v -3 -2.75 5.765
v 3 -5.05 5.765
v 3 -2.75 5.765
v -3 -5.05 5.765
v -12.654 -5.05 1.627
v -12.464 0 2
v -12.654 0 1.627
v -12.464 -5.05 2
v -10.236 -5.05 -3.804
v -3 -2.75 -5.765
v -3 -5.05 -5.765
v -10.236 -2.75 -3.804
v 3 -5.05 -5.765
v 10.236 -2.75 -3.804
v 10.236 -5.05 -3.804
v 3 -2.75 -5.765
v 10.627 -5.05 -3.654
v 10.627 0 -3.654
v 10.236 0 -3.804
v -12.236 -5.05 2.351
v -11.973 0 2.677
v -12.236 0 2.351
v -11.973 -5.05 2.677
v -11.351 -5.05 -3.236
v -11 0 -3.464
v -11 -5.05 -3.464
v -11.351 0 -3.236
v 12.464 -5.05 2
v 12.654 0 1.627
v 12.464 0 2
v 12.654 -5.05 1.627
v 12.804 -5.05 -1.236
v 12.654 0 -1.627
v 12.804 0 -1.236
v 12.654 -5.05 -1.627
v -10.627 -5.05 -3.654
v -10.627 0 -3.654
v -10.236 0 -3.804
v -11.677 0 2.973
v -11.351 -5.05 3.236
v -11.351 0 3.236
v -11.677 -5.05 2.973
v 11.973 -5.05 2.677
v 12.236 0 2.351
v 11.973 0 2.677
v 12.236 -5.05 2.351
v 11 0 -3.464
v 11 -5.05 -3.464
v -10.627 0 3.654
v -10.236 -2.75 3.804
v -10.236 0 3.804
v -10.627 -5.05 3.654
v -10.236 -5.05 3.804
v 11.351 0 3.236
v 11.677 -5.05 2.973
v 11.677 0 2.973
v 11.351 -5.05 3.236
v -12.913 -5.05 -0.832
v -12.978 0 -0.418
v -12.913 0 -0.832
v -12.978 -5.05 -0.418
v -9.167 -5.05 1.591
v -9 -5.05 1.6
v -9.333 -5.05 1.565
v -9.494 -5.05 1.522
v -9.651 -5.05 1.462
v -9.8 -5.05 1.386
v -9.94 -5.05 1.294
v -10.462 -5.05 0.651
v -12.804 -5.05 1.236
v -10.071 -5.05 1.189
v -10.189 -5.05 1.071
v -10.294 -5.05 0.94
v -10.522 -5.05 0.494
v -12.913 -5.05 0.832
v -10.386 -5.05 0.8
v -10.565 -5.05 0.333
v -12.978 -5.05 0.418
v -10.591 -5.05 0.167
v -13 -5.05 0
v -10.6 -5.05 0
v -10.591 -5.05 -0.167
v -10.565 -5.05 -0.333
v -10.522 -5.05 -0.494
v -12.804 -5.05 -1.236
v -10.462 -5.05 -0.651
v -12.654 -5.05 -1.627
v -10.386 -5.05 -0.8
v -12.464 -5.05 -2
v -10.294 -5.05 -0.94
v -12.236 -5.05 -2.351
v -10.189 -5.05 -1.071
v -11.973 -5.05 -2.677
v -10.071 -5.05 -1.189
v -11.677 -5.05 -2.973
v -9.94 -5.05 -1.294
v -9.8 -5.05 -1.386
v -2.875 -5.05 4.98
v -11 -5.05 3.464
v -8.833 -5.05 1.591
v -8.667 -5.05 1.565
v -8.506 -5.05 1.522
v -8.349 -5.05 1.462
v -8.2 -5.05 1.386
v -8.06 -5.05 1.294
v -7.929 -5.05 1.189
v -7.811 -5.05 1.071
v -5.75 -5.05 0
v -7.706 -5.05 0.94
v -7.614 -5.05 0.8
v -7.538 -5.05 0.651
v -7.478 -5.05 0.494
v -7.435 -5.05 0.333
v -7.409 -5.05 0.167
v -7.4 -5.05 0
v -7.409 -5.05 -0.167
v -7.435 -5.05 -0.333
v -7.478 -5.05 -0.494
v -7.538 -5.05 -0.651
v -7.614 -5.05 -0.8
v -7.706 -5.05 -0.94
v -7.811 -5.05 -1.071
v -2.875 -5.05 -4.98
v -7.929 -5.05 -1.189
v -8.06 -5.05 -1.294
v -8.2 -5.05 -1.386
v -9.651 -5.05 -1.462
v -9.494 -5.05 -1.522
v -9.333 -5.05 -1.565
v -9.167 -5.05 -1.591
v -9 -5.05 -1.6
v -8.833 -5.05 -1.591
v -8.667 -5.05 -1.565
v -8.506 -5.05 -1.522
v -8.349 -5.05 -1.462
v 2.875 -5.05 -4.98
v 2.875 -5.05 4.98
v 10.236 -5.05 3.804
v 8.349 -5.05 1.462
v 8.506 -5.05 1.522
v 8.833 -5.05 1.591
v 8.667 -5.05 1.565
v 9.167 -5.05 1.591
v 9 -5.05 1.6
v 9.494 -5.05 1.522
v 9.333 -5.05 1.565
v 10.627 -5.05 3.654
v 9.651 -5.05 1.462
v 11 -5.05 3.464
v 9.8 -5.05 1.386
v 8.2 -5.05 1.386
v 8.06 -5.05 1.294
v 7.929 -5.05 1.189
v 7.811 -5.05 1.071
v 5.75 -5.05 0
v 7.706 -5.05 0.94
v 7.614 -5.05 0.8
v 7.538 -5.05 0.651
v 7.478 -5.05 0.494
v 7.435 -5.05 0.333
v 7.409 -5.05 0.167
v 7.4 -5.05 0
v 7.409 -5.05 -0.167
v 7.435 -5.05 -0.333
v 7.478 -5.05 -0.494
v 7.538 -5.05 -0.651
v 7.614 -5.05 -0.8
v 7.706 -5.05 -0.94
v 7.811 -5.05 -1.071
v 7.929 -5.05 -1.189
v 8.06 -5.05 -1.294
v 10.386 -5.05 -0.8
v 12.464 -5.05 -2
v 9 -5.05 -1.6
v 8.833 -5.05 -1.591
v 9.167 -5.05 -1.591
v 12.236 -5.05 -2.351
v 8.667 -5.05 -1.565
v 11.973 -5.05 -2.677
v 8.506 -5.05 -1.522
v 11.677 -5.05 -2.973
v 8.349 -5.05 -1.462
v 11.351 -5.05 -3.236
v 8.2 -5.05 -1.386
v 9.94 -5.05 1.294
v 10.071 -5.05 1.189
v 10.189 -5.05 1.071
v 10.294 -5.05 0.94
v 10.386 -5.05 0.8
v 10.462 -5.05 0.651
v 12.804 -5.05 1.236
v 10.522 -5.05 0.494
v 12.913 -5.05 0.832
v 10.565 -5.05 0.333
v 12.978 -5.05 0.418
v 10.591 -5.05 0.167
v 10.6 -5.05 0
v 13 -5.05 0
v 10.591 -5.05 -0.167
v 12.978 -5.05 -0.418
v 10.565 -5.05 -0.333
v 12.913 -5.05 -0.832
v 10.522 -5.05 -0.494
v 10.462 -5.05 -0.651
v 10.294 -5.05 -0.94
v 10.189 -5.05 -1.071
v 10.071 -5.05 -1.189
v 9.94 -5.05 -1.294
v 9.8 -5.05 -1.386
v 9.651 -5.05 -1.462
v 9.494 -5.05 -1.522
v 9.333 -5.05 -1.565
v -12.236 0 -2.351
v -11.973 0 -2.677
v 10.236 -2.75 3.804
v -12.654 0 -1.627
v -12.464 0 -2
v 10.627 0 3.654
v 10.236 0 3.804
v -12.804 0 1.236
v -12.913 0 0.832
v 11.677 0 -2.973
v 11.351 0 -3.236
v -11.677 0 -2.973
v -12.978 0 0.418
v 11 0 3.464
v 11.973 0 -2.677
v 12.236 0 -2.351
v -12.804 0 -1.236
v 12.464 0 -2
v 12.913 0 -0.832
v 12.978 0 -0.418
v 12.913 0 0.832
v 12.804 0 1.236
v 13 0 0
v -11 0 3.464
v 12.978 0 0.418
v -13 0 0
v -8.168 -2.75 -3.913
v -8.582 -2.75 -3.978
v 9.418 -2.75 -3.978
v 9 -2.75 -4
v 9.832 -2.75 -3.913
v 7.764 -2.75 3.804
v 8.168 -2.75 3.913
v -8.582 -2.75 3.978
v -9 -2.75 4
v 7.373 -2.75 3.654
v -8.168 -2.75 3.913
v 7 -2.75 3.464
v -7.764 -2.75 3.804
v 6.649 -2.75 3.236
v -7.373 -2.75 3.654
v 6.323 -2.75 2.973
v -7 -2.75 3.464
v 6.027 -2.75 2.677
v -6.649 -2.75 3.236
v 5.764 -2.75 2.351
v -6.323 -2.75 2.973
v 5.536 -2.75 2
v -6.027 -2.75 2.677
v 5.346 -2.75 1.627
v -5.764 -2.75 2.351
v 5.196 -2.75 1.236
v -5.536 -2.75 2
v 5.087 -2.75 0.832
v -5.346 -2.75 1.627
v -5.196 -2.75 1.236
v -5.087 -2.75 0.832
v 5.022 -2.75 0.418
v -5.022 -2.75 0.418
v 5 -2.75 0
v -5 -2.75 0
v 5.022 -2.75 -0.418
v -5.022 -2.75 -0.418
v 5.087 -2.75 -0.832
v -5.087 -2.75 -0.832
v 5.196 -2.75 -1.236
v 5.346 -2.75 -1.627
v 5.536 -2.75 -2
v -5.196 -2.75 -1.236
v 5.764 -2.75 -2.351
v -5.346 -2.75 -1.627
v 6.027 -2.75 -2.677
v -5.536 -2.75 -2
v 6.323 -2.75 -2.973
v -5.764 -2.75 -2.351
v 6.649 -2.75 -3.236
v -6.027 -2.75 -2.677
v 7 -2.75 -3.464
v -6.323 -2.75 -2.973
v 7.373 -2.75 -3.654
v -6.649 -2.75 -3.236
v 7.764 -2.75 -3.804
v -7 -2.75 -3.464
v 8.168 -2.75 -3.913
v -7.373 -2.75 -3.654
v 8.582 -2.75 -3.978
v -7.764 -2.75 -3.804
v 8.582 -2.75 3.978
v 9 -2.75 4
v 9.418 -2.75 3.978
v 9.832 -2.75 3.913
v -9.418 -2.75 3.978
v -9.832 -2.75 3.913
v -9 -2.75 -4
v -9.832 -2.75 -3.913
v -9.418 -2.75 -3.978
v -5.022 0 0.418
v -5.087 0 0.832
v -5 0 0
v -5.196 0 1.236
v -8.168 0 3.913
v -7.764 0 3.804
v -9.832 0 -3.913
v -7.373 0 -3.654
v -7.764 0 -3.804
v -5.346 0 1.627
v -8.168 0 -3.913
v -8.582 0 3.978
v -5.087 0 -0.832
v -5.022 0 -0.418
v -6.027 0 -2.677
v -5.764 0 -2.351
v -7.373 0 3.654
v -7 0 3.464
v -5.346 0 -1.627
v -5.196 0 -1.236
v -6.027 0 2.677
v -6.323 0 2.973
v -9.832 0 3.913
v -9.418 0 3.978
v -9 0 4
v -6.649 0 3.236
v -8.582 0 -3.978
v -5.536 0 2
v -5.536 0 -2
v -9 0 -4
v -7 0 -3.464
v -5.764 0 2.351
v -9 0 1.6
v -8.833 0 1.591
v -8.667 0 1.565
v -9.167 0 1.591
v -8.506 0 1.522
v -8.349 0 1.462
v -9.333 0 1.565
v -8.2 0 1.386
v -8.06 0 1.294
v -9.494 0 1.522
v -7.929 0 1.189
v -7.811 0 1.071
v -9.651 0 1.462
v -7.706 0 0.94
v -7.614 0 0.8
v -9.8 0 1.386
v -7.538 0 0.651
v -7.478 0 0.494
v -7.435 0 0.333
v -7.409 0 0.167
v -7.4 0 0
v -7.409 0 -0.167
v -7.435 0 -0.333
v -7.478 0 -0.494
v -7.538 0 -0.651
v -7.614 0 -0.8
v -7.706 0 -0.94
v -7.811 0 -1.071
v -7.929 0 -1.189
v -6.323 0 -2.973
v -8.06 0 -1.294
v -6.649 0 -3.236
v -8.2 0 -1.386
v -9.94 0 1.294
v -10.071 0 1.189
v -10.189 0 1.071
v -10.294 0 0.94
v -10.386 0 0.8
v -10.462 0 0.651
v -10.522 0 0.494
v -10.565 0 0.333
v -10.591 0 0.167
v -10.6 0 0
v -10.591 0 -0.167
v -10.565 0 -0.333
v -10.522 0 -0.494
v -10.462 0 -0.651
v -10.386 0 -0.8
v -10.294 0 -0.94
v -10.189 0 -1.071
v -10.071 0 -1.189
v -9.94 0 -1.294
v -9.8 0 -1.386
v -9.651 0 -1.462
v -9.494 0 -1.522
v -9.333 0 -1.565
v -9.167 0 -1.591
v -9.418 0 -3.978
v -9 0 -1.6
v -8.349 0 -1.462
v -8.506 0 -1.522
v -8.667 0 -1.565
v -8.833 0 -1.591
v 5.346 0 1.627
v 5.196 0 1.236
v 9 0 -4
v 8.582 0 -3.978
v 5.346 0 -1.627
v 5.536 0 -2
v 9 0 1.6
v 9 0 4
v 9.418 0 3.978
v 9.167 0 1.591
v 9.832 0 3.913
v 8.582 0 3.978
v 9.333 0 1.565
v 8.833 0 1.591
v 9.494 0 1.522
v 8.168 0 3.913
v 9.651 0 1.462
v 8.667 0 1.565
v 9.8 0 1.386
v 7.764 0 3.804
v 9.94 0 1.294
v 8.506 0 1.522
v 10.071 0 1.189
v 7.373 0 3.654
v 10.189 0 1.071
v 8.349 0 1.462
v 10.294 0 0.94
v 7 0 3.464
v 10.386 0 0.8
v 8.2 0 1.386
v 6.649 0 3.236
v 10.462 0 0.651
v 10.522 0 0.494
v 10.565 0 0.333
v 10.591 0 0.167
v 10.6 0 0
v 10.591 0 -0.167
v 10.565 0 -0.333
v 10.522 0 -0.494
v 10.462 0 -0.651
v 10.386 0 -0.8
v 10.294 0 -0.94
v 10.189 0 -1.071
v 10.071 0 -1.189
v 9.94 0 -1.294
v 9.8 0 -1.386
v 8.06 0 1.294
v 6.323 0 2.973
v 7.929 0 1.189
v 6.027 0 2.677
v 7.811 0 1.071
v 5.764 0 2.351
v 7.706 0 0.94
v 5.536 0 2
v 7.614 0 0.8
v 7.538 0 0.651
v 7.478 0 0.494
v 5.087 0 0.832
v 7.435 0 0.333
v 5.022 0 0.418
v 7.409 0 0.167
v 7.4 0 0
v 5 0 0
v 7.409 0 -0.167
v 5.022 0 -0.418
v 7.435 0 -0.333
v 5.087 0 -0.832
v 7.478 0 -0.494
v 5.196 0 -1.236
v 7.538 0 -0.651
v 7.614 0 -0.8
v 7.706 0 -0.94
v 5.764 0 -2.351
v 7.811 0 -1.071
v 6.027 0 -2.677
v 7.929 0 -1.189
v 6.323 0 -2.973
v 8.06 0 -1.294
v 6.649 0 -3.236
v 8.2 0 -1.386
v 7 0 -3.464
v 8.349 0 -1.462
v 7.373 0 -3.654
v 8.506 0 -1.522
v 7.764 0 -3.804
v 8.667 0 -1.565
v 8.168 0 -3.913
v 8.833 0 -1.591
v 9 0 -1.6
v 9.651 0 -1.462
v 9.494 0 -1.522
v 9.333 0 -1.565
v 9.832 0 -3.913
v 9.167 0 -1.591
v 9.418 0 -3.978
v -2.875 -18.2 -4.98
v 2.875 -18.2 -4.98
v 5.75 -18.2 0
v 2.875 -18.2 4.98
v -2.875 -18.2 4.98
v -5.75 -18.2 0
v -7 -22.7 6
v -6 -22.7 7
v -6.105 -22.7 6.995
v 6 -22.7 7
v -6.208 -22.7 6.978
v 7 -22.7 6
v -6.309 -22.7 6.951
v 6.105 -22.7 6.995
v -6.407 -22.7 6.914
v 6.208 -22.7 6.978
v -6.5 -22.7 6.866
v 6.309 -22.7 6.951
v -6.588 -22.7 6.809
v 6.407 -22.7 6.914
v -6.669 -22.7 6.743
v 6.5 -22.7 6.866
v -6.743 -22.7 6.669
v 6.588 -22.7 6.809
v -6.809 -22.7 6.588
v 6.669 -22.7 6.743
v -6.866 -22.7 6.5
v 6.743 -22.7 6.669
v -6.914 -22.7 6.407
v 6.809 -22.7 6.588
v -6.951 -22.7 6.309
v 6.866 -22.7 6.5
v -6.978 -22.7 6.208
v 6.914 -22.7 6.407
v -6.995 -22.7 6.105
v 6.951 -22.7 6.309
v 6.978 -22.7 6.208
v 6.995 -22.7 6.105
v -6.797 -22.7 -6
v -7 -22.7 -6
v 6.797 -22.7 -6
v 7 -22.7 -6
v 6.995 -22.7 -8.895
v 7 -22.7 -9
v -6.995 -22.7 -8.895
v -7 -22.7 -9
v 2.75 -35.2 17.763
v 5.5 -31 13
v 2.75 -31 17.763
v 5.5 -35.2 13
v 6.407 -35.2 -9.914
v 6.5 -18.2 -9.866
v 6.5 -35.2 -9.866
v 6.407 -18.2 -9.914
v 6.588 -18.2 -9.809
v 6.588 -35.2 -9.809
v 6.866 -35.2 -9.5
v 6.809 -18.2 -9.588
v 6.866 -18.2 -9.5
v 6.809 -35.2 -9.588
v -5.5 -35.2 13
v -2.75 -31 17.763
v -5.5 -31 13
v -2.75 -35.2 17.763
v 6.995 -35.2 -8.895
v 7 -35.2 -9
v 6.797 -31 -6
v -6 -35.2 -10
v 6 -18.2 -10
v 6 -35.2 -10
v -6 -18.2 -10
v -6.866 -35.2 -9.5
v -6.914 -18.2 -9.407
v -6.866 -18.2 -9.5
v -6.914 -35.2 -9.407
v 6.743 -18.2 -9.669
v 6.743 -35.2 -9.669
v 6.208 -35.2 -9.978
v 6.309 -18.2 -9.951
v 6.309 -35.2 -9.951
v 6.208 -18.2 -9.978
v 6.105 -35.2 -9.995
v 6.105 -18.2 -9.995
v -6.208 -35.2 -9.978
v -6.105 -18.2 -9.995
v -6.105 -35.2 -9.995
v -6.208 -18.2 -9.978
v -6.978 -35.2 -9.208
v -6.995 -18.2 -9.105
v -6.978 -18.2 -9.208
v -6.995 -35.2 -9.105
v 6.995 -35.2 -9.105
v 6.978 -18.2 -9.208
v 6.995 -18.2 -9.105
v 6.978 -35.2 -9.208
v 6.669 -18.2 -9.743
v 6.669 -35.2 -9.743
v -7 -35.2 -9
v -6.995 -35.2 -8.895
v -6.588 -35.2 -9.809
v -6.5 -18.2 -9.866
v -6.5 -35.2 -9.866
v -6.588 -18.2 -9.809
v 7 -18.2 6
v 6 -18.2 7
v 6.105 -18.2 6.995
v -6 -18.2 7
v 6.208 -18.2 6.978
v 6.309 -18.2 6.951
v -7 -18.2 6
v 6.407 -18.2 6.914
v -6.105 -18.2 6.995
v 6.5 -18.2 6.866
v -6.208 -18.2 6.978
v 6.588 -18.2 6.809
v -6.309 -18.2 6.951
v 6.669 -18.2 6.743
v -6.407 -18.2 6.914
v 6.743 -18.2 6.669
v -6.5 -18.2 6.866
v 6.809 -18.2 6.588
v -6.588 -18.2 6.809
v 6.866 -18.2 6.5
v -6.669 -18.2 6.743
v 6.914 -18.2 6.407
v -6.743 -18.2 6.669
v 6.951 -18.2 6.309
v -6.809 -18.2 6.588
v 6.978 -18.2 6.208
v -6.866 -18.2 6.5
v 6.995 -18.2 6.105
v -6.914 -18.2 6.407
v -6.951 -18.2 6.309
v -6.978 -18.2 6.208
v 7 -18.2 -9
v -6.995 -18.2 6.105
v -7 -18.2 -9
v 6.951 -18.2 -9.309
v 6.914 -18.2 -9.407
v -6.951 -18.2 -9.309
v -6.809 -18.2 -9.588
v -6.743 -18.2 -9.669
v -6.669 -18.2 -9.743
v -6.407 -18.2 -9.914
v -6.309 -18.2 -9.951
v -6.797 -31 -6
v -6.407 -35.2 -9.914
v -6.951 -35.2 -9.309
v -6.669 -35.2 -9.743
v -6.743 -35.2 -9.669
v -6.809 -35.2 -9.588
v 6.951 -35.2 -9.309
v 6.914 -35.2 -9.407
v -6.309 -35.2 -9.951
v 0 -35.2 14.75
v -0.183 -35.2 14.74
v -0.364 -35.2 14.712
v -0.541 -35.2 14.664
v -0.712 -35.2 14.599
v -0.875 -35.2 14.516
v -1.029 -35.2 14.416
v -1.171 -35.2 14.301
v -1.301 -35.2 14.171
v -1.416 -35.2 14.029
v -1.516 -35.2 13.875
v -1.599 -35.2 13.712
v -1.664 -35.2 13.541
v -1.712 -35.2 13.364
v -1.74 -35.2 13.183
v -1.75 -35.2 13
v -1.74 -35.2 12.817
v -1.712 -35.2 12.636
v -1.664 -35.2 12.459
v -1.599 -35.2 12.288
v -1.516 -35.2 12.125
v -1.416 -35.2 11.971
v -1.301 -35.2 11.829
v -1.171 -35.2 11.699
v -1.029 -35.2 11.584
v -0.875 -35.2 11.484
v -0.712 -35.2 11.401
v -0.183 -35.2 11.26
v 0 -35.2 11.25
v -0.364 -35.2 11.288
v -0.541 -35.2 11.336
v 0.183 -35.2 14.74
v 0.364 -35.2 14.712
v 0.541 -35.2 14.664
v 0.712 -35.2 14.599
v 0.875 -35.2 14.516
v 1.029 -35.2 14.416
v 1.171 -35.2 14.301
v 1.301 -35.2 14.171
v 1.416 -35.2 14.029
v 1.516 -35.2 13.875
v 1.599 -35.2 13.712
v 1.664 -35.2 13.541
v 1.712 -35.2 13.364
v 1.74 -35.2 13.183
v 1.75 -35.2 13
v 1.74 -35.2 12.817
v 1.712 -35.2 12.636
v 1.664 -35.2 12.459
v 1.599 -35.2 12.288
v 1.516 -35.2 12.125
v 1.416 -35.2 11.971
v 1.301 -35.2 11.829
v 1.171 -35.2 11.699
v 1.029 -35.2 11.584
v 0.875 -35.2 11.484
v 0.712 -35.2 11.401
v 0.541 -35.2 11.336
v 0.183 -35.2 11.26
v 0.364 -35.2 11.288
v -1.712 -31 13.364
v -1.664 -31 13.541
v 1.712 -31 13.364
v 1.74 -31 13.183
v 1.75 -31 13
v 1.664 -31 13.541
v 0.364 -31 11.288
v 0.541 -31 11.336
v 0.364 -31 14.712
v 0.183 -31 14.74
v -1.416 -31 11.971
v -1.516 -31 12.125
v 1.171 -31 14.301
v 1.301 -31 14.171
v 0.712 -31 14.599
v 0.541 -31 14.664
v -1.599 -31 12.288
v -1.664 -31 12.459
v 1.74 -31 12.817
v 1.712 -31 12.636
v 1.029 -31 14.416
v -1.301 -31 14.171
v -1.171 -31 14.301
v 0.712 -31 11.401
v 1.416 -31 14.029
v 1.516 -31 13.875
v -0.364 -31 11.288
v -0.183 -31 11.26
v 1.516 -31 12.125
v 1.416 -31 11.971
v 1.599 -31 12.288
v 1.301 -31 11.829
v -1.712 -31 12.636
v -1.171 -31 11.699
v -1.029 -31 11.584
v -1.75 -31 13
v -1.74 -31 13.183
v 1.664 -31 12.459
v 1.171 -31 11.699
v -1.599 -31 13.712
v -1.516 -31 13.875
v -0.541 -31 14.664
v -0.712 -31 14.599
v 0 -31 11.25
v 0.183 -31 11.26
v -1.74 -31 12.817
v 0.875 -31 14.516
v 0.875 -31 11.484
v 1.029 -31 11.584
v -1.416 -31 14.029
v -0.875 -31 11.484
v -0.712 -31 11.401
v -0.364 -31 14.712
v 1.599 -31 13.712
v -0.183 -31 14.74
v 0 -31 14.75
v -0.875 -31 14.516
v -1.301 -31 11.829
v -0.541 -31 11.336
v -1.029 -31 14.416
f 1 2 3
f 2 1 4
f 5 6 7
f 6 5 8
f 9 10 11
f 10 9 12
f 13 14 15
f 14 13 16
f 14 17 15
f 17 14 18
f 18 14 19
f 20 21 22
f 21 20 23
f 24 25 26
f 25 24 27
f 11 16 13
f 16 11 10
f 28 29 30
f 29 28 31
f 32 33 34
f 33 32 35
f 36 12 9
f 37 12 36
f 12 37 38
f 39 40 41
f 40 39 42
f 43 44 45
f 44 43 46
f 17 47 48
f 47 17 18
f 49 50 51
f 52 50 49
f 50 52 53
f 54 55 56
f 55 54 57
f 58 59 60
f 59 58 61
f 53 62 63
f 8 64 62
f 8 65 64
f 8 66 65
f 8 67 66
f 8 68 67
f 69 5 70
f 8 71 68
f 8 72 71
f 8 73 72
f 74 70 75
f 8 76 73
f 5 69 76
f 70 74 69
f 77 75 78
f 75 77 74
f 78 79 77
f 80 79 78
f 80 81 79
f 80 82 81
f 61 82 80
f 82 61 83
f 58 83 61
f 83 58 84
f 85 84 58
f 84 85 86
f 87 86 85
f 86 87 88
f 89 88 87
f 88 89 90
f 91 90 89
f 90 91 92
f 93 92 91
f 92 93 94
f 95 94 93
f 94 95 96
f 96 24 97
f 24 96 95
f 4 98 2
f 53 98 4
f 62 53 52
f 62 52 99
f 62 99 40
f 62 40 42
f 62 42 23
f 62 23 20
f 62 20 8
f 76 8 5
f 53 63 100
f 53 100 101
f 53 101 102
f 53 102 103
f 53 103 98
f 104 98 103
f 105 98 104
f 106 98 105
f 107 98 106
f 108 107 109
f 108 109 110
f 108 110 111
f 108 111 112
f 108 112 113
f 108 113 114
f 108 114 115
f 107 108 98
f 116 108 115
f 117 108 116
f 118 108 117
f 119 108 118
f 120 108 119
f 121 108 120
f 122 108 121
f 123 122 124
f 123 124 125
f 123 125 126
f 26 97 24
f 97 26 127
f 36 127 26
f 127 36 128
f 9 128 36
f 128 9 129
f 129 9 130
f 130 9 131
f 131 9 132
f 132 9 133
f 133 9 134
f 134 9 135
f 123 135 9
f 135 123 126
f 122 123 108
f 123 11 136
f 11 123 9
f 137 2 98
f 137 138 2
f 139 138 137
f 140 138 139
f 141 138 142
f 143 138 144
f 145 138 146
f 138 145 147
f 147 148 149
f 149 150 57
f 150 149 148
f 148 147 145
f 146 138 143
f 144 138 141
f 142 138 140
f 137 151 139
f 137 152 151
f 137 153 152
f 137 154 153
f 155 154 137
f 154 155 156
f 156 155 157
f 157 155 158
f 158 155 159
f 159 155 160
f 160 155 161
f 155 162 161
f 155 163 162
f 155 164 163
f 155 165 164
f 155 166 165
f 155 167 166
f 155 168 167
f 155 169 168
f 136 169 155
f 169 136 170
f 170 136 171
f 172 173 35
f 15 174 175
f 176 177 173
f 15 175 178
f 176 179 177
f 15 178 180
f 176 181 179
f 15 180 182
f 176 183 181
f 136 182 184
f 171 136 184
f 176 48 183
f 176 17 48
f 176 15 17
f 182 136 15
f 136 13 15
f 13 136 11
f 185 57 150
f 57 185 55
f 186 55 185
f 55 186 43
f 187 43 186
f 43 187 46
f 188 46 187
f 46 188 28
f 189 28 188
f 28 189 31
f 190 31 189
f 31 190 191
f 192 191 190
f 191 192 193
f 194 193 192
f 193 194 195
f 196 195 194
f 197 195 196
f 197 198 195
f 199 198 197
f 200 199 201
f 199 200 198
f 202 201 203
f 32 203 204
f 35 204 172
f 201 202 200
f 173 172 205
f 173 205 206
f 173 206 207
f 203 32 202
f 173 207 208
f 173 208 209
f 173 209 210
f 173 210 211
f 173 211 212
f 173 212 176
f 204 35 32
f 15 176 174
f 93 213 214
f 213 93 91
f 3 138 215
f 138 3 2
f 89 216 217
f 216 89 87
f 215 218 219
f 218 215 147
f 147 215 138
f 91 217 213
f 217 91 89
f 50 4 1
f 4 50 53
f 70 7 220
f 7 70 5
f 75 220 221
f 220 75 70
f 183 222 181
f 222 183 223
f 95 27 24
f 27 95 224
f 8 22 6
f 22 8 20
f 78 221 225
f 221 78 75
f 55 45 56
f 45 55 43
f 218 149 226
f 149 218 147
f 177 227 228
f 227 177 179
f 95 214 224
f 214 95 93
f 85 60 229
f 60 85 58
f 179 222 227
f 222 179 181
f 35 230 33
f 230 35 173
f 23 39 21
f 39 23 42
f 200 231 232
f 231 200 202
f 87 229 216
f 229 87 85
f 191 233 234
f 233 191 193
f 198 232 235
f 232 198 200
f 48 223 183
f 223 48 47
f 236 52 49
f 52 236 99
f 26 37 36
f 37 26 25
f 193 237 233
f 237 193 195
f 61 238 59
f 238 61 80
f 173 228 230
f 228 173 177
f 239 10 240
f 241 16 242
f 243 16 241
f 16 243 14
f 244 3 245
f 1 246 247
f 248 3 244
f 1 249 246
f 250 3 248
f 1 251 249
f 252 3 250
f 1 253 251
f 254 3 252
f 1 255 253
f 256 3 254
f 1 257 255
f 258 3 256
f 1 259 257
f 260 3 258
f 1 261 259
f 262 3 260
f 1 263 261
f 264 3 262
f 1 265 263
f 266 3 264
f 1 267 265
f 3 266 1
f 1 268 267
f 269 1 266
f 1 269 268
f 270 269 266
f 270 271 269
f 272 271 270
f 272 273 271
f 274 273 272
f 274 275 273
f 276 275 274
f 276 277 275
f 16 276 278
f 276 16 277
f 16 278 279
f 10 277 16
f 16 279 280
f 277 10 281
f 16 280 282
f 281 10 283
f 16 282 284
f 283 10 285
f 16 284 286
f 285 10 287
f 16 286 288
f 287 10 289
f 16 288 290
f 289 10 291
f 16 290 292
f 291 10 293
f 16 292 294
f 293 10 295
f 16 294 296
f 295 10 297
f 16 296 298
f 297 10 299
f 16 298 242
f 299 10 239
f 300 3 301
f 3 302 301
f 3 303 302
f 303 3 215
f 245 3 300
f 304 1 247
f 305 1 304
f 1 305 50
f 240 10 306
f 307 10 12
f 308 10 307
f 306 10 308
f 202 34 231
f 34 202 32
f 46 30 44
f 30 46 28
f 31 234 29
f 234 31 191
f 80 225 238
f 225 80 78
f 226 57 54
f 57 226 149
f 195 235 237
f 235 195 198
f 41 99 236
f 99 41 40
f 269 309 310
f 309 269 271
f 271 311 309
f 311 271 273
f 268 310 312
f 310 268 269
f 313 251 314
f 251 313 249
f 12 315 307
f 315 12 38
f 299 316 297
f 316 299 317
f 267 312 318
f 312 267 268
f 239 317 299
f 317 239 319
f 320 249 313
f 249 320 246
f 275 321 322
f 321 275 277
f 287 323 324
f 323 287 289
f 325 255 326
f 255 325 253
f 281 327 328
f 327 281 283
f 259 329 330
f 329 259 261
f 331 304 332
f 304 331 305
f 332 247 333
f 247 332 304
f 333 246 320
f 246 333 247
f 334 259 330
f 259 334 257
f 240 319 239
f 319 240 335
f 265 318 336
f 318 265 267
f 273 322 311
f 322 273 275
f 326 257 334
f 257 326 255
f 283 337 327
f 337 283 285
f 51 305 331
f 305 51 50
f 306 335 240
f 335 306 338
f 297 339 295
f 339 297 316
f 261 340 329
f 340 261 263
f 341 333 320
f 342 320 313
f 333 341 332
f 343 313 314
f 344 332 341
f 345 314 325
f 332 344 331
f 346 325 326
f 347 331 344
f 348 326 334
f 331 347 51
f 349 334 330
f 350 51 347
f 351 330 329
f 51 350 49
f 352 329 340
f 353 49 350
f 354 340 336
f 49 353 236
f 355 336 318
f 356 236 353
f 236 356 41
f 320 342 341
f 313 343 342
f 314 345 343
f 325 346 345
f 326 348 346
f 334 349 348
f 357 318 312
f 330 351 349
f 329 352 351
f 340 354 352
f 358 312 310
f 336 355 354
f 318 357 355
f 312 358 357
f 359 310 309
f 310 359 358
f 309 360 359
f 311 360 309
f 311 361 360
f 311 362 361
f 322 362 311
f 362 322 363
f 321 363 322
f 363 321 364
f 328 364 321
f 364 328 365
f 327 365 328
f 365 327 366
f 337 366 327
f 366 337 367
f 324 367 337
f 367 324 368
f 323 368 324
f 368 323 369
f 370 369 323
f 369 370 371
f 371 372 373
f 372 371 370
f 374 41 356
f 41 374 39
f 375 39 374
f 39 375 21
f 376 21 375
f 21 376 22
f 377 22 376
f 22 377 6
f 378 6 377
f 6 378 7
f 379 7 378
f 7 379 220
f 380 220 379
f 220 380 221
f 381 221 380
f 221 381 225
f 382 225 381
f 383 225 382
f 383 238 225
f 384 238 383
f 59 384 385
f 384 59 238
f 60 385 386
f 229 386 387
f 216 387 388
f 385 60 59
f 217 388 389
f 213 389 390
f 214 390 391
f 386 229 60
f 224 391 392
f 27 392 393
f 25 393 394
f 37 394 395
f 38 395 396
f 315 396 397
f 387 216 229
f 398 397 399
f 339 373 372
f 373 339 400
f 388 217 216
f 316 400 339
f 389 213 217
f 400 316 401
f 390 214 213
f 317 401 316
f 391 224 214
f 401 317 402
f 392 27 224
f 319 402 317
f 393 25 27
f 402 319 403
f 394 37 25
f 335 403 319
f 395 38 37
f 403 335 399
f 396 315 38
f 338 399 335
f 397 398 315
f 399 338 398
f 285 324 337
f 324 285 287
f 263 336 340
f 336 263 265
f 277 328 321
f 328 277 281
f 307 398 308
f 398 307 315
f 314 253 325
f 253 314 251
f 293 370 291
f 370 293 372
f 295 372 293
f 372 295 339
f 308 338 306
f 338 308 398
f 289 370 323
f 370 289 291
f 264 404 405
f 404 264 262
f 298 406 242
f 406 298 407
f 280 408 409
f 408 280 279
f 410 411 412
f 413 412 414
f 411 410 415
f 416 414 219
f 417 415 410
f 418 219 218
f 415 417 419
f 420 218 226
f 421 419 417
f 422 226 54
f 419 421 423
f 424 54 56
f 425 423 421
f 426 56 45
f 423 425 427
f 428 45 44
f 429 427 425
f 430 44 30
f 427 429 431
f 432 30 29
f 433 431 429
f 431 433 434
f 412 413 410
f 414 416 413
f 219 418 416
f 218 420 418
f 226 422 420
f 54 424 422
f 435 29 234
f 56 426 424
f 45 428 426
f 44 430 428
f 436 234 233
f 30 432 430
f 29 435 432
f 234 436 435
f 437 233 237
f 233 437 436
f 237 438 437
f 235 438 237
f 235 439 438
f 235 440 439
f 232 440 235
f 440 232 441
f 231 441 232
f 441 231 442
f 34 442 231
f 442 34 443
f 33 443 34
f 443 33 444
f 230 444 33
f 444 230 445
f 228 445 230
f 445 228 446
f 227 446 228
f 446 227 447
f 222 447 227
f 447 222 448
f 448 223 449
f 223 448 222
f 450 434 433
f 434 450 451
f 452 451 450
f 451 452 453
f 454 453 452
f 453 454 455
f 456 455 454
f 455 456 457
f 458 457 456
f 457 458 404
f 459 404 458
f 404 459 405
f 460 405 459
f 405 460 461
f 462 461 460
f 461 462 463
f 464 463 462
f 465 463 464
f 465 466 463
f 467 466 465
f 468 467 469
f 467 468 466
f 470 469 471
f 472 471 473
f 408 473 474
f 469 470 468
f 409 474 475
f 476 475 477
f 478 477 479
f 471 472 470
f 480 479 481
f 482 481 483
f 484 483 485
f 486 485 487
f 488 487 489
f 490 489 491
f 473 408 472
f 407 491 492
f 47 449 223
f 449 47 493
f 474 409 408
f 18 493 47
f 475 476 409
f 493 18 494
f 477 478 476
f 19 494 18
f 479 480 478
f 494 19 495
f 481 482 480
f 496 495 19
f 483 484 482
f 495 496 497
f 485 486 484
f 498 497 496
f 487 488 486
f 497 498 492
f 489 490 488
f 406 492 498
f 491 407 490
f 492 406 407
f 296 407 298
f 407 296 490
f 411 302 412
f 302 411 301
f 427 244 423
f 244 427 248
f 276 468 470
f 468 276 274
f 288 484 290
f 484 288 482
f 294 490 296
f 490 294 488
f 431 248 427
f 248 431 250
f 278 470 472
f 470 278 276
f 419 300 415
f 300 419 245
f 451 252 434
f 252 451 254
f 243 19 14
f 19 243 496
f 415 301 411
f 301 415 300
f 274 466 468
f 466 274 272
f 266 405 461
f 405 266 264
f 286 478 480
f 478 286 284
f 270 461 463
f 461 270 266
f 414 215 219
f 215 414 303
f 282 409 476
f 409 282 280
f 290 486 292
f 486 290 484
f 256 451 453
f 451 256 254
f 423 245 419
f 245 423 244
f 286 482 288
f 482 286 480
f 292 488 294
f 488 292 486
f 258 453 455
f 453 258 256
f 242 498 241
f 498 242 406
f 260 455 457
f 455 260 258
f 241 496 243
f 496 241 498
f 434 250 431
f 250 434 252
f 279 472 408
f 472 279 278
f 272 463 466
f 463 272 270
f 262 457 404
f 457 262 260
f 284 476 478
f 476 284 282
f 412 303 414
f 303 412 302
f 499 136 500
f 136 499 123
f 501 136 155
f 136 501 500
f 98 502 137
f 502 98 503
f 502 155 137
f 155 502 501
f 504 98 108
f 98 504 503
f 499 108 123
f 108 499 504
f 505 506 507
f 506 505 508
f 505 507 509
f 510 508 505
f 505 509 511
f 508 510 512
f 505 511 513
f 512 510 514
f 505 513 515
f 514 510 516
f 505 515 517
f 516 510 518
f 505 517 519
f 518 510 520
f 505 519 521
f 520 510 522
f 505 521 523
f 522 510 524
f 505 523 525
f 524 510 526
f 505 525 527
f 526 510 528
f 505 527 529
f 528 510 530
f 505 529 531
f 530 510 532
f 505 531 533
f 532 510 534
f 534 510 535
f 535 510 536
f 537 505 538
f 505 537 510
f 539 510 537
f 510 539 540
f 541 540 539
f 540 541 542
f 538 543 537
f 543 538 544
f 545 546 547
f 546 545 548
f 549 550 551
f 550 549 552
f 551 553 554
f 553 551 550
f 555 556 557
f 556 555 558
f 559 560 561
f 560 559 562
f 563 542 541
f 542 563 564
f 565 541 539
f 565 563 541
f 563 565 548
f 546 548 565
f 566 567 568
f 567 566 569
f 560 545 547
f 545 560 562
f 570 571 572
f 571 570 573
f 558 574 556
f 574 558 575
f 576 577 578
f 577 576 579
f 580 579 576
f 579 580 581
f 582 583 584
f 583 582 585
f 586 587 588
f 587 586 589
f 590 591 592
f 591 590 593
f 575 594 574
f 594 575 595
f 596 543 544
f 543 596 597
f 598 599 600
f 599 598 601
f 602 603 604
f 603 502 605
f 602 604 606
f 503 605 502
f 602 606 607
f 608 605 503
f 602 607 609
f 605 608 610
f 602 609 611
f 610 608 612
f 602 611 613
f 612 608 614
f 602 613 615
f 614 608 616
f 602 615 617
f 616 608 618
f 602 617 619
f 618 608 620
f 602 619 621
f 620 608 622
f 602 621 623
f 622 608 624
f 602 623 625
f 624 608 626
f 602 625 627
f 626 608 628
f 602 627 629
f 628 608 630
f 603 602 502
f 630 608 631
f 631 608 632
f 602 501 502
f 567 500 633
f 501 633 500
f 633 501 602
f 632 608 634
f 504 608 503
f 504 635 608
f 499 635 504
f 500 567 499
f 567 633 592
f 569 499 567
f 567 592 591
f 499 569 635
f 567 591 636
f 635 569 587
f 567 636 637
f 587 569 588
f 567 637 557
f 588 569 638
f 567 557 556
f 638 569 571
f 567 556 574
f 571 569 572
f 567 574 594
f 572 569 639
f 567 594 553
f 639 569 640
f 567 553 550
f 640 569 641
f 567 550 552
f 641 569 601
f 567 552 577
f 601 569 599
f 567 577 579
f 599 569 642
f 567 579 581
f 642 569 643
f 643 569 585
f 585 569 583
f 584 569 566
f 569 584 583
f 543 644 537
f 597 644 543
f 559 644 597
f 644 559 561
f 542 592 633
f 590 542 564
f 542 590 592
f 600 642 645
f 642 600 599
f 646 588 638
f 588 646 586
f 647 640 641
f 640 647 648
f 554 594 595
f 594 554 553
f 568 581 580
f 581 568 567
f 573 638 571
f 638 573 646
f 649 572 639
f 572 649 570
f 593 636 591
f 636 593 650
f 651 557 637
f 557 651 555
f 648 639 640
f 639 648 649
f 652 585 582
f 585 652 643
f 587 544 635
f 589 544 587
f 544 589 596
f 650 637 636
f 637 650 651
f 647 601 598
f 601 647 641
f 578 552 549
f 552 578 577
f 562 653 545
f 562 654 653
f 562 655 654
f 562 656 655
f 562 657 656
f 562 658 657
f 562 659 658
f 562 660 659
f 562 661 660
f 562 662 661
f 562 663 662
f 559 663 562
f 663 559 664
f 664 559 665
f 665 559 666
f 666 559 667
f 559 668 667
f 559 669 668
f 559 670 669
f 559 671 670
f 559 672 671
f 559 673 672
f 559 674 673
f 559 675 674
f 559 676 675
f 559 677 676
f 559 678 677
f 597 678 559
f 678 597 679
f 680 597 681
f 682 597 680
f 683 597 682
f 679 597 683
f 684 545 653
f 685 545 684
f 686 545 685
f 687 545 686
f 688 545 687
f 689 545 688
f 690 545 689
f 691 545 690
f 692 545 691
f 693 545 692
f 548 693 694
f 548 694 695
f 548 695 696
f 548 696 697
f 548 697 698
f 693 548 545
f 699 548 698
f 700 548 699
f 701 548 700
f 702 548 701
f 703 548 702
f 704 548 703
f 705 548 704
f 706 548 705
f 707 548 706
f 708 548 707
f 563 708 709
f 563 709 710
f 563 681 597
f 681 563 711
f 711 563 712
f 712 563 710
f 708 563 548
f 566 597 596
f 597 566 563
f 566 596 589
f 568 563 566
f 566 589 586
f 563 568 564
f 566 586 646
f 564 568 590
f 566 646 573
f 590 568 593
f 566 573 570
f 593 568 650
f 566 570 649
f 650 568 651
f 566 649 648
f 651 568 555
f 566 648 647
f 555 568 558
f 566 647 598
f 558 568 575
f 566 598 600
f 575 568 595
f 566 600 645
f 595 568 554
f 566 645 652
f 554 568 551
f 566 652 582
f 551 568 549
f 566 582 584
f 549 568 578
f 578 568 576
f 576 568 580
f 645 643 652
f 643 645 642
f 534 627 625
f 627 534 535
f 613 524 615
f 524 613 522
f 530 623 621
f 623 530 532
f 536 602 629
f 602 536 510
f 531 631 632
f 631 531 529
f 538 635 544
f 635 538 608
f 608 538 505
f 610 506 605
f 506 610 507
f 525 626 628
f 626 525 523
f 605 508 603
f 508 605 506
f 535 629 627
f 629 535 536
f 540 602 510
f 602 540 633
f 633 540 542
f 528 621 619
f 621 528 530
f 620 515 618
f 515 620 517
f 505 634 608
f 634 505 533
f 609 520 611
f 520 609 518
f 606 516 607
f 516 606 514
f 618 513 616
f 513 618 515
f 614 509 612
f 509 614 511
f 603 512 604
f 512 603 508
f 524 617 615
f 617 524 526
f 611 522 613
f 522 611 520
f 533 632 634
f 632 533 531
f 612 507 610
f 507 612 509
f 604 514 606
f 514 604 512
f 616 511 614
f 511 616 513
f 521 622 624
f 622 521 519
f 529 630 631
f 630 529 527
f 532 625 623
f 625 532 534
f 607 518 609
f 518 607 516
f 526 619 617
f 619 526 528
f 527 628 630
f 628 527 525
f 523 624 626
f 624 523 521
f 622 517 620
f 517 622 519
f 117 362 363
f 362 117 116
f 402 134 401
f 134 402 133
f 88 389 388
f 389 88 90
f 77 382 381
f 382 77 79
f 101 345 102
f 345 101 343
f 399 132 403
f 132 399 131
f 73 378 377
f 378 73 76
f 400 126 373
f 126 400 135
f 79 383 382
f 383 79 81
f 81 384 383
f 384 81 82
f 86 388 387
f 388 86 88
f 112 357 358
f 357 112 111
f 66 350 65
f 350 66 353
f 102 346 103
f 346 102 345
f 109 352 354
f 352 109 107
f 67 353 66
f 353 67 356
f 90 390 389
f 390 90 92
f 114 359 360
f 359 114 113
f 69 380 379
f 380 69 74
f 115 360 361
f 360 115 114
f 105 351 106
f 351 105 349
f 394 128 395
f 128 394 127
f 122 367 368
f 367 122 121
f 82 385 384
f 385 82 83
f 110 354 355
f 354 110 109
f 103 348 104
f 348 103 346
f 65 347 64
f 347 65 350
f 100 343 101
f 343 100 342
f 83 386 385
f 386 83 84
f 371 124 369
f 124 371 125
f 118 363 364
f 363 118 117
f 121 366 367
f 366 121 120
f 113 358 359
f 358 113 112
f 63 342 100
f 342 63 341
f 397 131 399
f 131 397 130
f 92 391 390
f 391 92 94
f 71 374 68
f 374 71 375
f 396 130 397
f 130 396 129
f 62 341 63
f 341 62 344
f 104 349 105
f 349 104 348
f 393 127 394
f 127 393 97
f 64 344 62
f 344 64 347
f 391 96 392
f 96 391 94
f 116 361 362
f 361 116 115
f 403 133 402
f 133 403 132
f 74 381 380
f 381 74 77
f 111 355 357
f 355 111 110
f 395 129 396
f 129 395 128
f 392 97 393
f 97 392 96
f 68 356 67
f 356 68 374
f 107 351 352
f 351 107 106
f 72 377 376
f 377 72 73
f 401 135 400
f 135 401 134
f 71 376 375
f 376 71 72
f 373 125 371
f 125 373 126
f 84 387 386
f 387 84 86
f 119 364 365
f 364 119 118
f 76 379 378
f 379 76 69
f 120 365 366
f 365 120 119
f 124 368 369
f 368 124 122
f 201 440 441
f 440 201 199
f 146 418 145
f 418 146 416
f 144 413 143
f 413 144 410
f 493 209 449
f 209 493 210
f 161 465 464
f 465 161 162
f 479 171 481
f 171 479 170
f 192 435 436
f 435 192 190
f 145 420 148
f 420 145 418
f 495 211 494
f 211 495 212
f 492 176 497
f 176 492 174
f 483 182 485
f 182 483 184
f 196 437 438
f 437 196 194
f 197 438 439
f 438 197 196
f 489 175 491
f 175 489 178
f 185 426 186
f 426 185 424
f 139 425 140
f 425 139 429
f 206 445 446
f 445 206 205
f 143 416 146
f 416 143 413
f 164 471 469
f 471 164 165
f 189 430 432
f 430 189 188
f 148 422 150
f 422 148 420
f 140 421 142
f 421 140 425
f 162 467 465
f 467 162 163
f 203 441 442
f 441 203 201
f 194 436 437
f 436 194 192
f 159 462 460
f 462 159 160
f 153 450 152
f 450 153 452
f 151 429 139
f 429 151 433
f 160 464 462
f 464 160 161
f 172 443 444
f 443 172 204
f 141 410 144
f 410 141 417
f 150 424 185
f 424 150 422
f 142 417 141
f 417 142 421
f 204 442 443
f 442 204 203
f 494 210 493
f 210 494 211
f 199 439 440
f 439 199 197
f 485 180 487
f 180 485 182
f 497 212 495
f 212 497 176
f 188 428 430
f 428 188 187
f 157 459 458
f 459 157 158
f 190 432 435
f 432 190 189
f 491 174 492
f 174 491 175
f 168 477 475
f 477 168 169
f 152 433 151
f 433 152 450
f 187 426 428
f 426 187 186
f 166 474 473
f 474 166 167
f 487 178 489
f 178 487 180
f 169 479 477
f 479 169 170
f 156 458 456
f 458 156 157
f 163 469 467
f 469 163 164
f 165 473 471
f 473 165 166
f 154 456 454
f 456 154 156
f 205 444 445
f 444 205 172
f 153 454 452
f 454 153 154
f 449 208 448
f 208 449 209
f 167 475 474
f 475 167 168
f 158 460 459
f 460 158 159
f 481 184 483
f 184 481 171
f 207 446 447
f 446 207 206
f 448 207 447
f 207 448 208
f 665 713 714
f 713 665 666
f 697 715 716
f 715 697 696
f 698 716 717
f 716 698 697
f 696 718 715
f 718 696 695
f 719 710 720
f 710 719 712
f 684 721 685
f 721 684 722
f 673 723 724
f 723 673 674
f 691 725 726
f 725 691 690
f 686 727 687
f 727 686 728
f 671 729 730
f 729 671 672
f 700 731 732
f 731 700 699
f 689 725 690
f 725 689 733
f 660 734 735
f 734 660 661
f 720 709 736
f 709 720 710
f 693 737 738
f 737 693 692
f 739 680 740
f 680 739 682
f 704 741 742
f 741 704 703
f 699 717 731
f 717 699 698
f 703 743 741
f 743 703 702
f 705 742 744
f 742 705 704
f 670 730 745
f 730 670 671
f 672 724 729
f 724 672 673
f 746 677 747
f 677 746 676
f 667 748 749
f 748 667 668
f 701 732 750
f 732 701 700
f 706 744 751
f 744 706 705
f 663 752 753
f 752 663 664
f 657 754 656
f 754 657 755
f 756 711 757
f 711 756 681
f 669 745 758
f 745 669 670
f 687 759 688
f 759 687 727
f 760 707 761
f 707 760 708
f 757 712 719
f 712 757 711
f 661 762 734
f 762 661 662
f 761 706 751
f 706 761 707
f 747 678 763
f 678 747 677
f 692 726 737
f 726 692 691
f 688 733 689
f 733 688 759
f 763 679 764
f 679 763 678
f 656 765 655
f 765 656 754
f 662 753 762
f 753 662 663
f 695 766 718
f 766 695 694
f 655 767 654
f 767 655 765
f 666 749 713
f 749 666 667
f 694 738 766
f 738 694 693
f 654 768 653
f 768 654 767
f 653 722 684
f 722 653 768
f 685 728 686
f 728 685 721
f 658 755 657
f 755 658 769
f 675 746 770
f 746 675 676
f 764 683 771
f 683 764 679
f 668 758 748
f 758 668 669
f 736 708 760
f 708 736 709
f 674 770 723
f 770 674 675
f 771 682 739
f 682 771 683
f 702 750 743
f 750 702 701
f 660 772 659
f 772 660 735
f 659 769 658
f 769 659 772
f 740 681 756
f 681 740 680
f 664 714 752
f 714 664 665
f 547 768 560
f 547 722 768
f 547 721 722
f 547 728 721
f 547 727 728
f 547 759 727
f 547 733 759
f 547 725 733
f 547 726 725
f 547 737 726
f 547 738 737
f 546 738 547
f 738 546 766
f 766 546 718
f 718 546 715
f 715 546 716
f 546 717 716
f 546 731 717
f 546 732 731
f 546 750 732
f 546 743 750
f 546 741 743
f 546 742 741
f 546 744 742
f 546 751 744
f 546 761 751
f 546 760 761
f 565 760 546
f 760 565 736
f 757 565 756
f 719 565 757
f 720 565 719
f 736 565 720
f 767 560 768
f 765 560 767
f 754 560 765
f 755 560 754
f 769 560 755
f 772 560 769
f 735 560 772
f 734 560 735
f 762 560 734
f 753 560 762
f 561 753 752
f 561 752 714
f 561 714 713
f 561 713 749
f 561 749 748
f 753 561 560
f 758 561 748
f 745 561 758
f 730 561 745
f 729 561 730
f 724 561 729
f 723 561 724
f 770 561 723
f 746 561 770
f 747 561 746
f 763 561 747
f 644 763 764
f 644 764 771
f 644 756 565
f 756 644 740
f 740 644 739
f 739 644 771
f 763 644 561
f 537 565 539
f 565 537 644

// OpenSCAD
module fhex(wid,height){
  hull(){
    cube([wid/1.7,wid,height],center=true);
    rotate([0,0,120]) cube([wid/1.7,wid,height], center=true);
    rotate([0,0,240]) cube([wid/1.7,wid,height], center=true);
  }
}

//rotate([0,180,0]) bltouch();
// 67 - 36.3 -8 == 22.8

rotate([90,0,0]) dual_delta_bltouch();
module dual_delta_bltouch(){
//    translate([-7, -6, 0]) %cube([14,19,22.7]);
    difference(){
        union(){
            translate([0, 0, 3.9]) hull(){
              translate([-9, 0, 0]) cylinder(r=4, h=2.3, center=true, $fn=60);
              cube([6,11.53,2.3], center=true);
              translate([9, 0, 0]) cylinder(r=4, h=2.3, center=true, $fn=60);
            }
            translate([-9, 0, 2.5]) cylinder(r=4, h=5, center=true, $fn=60);
            translate([9, 0, 2.5]) cylinder(r=4, h=5, center=true, $fn=60);
            translate([0, 0, 13.85]) cylinder(d=11.5, h=17.7, center=true, $fn=6);
            
            hull(){
                translate([0, 13, 32.95]) cylinder(d=11, h=4.5, center=true, $fn=6);
                translate([6, -9, 26.7]) cylinder(d=2, h=9+8, center=true, $fn=60);
                translate([-6, -9, 26.7]) cylinder(d=2, h=9+8, center=true, $fn=60);
            }
            hull(){
                translate([6,-9, 20.45]) cylinder(d=2, h=4.5, center=true, $fn=60);
                translate([-6, -9, 20.45]) cylinder(d=2, h=4.5, center=true, $fn=60);
                translate([6, 6, 20.45]) cylinder(d=2, h=4.5, center=true, $fn=60);
                translate([-6, 6, 20.45]) cylinder(d=2, h=4.5, center=true, $fn=60);
            }
        }
        for(X=[-1,1]){
          translate([9*X, 0, 2.5]) cylinder(d=3.2, h=5.2, center=true, $fn=60);
        }
        translate([0, 13, 32.95]) cylinder(d=3.5, h=5, center=true, $fn=60);
        translate([-10, -6, 22.7]) cube([20,25,8.3]);
    }
    
}

module bltouch(){
  translate([0, 0, 1.15]) 
  difference(){
    hull(){
      translate([-9, 0, 0]) cylinder(r=4, h=2.3, center=true, $fn=60);
      cube([6,11.53,2.3], center=true);
      translate([9, 0, 0]) cylinder(r=4, h=2.3, center=true, $fn=60);
    }
    for(X=[-1,1]){
      translate([9*X, 0, -0.01]) cylinder(d=3.2, h=2.5, center=true, $fn=60);
    }
  }
  translate([0, 0, 3.85+2.3]) cylinder(d=11.5, h=7.7, center=true, $fn=60);
  hull(){
    translate([0, 3.05, 20.65]) cube([13,6.5,21.3], center=true);
    translate([0, 0, 20.65]) cylinder(d=13, h=21.3, center=true, $fn=60);
    translate([0, 0, 35.3]) cylinder(d=6.8, h=2, center=true, $fn=60);
  }
  translate([0, 6, 8]) cube([6.75,1.15,20], center=true); //wires
  translate([0, 0, 34.3]) color([.71,.71,.71]) cylinder(d=1.9, h=20, center=true, $fn=60);
}

module bltouch_hole(extra=0.5){
    translate([0, 3.05, 20.65]) cube([13+extra,6.5+extra,21.3], center=true);
    translate([0, 0, 20.65]) cylinder(d=13+extra, h=21.3, center=true, $fn=60);
}


module bltouch_mount(){
  difference(){
    union(){
      hull(){
        translate([4,-10,5.5]) rotate([90,0,0]) cylinder(d=6, h=2, center=true, $fn=60);
        translate([-4,-10,5.5]) rotate([90,0,0]) cylinder(d=6, h=2, center=true, $fn=60);
        translate([0,-2,5]) rotate([90,0,0]) cylinder(d=6, h=18, center=true, $fn=60);
        cube([6,11.53,1], center=true);
      }
      translate([-5,-11.5,5.5]) rotate([90,0,0]) cylinder(d=2.5, h=2, center=true, $fn=60);
      translate([5,-11.5,5.5]) rotate([90,0,0]) cylinder(d=2.5, h=2, center=true, $fn=60);
    }
    translate([0,-2,5]) rotate([90,0,0]) cylinder(d=3.5, h=20, center=true, $fn=60);
  }
  translate([0, 0, 0.11]) difference(){
    hull(){
      translate([-9, 0, 0]) cylinder(r=4, h=2.3, center=true, $fn=60);
      cube([6,11.53,2.3], center=true);
      translate([9, 0, 0]) cylinder(r=4, h=2.3, center=true, $fn=60);
    }
    for(X=[-1,1]){
      translate([9*X, 0, -0.01]) cylinder(d=3.2, h=2.5, center=true, $fn=60);
    }
  }
}
      
      
